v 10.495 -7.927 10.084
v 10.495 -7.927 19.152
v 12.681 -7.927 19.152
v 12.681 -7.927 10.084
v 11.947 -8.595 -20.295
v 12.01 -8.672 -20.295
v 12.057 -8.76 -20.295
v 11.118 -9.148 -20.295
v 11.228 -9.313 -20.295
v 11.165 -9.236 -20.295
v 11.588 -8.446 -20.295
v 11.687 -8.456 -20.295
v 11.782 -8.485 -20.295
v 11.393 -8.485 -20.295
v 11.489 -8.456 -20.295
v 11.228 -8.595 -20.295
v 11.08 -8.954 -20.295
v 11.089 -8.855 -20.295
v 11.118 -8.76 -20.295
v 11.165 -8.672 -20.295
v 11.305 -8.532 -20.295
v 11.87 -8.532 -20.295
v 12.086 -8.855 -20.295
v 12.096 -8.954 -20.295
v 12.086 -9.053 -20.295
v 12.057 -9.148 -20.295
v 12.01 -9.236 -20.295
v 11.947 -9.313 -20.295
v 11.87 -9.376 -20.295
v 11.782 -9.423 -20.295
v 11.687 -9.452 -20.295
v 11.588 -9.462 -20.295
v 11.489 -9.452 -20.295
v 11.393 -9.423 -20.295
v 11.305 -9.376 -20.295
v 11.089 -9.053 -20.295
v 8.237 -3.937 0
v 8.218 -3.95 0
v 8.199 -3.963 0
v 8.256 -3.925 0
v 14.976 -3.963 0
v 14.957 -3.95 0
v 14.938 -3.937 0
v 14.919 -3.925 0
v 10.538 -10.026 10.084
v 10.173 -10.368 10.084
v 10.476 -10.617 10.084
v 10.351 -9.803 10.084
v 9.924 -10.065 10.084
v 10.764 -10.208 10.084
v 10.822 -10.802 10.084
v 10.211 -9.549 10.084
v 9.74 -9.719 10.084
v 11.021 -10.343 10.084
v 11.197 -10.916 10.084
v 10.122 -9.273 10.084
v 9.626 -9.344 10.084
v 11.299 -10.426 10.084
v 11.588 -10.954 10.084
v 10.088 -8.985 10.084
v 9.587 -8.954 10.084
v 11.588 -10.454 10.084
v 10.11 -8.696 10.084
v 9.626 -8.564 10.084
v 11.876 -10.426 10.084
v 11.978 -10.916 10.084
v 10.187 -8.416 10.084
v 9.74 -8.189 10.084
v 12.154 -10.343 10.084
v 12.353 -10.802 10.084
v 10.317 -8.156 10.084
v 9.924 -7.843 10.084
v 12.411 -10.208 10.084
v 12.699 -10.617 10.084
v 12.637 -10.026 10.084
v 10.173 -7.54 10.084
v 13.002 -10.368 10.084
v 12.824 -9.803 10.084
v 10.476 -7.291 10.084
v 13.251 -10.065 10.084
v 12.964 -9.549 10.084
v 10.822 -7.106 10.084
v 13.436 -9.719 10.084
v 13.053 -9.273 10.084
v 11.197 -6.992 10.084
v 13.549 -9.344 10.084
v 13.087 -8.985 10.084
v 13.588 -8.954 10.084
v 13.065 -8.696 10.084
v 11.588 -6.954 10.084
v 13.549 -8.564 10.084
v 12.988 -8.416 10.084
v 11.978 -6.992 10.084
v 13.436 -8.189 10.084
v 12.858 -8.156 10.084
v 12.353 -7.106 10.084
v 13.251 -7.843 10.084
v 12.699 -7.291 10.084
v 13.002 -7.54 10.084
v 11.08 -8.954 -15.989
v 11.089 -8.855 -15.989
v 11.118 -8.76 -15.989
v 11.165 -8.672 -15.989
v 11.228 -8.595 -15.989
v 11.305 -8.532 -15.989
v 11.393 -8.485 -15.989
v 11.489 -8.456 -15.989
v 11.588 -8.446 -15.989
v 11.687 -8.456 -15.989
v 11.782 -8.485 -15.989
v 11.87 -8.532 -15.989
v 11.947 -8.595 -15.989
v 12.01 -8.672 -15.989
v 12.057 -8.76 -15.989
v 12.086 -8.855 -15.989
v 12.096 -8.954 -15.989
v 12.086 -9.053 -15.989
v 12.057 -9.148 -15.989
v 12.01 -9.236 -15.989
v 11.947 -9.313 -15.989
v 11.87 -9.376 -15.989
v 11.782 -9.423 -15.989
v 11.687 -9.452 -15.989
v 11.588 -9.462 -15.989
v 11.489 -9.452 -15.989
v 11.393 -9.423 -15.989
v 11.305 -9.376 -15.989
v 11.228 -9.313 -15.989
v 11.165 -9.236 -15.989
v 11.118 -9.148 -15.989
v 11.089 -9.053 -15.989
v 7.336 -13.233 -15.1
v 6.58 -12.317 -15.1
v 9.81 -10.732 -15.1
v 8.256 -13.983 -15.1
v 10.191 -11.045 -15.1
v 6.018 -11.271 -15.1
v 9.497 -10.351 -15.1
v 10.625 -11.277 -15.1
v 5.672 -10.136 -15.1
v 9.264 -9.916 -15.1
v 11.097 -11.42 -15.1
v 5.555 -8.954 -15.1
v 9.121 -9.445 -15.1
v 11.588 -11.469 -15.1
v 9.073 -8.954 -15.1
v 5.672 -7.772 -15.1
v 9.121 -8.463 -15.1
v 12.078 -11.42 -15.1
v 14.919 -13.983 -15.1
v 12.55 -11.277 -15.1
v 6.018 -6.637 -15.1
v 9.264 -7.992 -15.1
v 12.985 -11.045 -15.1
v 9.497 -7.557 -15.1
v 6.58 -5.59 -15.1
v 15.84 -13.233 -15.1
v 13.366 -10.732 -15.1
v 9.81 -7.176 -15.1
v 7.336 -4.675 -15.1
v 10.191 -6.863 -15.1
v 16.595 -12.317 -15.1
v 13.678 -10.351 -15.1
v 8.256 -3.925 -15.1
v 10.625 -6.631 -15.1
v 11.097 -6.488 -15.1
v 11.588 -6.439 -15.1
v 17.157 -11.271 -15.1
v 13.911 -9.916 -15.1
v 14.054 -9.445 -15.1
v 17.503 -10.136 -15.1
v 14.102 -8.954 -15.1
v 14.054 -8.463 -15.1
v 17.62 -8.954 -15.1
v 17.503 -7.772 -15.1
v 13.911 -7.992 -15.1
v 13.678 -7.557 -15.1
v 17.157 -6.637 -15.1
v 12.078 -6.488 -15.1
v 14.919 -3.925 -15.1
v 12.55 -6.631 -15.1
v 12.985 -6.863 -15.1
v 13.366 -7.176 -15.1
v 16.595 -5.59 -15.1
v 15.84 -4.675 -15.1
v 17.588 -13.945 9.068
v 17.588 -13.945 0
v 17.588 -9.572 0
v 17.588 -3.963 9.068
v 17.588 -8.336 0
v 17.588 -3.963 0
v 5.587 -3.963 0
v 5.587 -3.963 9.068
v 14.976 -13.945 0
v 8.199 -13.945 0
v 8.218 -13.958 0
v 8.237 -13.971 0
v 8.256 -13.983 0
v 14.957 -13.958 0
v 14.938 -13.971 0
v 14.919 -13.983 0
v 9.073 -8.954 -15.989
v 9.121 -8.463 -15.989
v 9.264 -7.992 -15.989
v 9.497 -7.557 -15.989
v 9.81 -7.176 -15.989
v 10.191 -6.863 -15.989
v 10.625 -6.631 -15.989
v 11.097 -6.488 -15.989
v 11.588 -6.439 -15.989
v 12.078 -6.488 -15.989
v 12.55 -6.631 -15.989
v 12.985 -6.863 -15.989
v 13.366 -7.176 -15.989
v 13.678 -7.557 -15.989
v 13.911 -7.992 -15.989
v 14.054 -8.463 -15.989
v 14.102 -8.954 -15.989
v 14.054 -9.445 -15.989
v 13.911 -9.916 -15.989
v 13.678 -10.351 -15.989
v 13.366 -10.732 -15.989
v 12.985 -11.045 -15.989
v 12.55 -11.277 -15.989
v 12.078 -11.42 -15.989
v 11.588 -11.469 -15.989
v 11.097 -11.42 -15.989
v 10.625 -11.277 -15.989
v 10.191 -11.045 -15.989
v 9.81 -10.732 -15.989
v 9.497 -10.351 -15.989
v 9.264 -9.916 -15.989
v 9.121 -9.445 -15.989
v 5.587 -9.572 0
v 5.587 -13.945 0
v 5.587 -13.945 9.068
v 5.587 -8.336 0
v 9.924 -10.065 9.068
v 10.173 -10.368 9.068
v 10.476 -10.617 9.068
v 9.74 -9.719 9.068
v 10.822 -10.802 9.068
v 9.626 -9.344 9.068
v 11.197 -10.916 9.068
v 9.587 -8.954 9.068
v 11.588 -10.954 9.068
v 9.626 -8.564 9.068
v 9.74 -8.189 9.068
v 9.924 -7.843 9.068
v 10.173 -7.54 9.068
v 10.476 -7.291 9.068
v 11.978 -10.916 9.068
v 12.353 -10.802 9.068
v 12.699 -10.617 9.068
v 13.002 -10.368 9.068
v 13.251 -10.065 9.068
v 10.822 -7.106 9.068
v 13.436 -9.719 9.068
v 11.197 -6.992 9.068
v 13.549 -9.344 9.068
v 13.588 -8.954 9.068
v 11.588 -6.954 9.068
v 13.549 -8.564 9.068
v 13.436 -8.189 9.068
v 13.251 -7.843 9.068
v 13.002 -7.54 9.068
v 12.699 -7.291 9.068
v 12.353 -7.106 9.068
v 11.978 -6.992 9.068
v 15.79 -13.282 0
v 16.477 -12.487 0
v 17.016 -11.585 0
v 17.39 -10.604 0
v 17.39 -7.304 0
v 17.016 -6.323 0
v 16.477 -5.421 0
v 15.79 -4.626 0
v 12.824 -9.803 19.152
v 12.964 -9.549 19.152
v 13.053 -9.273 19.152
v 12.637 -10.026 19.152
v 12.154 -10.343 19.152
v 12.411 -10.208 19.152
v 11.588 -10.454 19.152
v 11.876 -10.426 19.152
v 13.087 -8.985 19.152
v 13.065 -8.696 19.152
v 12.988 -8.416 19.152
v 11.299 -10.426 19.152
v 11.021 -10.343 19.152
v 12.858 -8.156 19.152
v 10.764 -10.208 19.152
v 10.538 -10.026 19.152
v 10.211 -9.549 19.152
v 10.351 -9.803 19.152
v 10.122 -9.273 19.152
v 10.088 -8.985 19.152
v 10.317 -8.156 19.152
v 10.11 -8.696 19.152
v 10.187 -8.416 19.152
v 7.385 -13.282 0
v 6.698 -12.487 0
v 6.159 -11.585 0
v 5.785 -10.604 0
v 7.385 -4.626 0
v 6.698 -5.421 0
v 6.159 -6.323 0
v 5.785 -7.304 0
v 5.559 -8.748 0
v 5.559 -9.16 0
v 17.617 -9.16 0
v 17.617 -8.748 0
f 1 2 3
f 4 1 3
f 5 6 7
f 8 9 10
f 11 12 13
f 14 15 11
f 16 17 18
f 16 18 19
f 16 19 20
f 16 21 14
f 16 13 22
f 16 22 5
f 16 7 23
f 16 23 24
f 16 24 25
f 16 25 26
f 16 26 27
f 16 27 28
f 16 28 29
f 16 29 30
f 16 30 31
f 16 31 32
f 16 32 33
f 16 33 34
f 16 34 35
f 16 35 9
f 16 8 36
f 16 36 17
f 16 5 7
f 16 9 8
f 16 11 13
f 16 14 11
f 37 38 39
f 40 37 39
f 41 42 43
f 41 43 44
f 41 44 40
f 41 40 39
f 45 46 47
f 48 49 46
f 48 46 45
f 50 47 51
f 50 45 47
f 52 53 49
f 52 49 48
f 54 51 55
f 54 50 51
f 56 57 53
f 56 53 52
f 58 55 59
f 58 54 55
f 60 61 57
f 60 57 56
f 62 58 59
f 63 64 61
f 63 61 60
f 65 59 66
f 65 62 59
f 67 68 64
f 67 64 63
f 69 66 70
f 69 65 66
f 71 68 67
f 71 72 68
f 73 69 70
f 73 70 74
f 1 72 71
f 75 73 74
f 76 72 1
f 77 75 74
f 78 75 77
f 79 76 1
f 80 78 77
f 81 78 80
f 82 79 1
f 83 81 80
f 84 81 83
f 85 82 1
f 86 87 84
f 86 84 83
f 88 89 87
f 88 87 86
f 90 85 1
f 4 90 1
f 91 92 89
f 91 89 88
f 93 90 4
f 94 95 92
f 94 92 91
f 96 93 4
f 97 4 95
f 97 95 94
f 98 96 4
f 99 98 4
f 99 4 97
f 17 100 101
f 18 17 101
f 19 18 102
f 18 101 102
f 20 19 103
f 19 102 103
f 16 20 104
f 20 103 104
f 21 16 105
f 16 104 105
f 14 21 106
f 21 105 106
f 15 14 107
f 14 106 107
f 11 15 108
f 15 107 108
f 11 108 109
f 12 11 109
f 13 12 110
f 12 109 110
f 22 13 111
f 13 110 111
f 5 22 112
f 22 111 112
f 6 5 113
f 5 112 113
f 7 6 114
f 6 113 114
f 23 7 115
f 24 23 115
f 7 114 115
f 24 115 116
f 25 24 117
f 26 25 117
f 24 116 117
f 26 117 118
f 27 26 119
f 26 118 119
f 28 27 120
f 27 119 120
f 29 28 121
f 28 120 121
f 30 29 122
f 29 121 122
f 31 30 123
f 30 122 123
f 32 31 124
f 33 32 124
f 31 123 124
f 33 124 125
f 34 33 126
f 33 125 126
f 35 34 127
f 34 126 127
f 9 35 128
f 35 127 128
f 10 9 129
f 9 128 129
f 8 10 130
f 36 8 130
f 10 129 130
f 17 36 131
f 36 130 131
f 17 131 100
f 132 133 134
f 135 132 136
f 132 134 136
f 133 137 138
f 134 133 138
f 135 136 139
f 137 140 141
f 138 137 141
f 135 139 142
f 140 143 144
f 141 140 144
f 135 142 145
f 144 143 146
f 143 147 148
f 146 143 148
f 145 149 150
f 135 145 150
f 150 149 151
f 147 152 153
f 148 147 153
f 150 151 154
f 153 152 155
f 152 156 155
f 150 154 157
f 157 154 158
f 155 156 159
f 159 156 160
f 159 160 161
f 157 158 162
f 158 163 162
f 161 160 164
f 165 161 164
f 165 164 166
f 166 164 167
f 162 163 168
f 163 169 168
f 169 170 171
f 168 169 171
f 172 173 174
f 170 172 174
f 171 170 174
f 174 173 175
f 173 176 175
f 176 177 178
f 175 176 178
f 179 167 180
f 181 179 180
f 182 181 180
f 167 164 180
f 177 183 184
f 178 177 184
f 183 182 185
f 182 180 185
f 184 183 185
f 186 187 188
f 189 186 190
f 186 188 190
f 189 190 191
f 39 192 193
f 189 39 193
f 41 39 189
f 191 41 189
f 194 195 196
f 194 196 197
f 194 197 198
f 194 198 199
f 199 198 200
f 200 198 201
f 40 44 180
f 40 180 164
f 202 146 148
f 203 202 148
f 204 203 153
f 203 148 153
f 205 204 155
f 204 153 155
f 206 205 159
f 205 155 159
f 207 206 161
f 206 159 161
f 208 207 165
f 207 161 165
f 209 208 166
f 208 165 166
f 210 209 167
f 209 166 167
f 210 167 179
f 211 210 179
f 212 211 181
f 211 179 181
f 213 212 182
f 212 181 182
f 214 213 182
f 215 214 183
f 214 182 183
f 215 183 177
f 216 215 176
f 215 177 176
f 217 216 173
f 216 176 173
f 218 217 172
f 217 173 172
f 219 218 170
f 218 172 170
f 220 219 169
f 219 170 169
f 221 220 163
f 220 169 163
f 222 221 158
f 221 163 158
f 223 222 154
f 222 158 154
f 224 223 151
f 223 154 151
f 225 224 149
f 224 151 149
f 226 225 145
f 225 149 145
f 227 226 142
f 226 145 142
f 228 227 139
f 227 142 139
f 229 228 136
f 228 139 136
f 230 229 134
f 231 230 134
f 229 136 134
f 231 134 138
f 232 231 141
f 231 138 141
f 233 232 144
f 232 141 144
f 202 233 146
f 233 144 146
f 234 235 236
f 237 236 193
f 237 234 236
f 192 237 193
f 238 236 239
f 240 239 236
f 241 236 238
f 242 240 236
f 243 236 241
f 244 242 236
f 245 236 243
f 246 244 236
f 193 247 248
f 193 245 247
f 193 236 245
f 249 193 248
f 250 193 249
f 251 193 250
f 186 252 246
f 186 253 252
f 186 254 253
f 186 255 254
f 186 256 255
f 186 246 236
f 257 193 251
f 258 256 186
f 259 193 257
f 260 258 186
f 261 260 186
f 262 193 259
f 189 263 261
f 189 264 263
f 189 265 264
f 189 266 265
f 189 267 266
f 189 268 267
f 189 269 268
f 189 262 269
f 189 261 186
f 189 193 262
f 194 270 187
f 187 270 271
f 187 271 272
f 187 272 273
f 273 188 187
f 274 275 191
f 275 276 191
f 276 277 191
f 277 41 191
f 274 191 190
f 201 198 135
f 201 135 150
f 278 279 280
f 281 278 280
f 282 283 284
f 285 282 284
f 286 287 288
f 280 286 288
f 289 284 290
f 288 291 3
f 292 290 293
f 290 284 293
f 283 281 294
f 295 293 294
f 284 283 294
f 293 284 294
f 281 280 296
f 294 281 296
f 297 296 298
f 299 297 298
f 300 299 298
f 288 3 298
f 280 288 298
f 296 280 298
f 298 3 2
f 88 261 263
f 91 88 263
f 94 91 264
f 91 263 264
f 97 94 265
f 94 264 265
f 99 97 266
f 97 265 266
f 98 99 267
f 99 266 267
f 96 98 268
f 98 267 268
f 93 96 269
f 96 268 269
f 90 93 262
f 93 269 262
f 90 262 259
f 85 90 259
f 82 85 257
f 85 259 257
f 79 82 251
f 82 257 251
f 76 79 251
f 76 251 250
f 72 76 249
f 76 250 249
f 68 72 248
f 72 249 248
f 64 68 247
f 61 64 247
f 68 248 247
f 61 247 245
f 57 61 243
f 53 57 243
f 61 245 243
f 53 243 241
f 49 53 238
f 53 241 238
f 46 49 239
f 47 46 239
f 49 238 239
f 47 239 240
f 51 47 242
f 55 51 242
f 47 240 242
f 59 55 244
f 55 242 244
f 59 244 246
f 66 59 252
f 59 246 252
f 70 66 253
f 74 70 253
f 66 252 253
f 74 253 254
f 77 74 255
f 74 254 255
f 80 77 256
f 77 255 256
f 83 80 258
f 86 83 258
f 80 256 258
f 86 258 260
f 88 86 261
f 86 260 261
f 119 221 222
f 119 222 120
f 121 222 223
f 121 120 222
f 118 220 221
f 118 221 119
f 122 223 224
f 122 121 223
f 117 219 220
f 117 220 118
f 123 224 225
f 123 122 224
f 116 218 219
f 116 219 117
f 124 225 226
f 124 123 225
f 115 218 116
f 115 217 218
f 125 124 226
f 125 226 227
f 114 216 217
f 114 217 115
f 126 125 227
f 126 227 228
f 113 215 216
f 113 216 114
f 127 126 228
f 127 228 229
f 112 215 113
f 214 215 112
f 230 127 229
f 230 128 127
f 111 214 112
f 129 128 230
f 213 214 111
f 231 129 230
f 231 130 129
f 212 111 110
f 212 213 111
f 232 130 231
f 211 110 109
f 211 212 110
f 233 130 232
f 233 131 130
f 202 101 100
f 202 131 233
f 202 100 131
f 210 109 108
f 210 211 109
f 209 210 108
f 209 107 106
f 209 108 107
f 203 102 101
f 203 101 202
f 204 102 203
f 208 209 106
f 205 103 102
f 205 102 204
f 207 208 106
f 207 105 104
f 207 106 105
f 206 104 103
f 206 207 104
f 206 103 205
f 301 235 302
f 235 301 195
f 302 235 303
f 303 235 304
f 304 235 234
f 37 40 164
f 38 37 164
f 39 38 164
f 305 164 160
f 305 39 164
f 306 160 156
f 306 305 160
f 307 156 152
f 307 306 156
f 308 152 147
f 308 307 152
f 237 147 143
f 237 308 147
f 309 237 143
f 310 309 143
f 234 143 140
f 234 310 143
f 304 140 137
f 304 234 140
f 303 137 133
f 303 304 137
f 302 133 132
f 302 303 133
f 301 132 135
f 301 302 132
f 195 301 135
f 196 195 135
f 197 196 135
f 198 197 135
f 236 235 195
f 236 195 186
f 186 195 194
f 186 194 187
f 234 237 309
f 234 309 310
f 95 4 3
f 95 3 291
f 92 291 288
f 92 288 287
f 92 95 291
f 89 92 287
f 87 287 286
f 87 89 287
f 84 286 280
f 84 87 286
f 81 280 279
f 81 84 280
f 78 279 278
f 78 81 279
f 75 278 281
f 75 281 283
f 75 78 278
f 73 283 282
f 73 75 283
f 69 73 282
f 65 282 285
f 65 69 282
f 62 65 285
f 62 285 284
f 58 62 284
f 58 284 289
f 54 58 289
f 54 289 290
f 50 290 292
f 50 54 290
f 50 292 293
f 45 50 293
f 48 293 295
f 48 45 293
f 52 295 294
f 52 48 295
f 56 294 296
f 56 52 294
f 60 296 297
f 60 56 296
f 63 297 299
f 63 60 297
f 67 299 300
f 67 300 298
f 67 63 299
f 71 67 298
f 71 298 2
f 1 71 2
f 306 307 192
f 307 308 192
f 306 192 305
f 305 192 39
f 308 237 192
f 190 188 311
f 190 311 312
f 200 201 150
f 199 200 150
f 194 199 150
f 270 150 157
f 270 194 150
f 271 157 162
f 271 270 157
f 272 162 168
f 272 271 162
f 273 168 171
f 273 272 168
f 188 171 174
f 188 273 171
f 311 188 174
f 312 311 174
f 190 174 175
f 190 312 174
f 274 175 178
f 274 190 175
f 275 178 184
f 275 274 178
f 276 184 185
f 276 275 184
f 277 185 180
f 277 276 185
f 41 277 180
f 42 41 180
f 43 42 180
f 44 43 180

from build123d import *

# Parameters (mm, degrees)
SKETCH1_W            = 12.0015
SKETCH1_H            = 9.9822
BOSS_EXTRUDE4_DEPTH  = 9.0678
BOSS_EXTRUDE5_DEPTH  = 15.1003
SKETCH4_R            = 2.00025
BOSS_EXTRUDE9_DEPTH  = 1.016
BOSS_EXTRUDE10_DEPTH = 9.0678
SKETCH6_R            = 2.5146
BOSS_EXTRUDE11_DEPTH = 0.889
SKETCH7_R            = 0.508
BOSS_EXTRUDE12_DEPTH = 4.3053


with BuildPart() as part:
    # Sketch1 → Boss-Extrude4 (new body)
    with BuildSketch(Plane.XY):
        with Locations((11.58762082, -8.953965436)):
            Rectangle(SKETCH1_W, SKETCH1_H)
    extrude(amount=BOSS_EXTRUDE4_DEPTH)

    # Sketch3 → Boss-Extrude5 (add)
    with BuildSketch(Plane(origin=(0, 0, 0), x_dir=(-1, 0, 0), z_dir=(0, 0, -1))):
        with BuildLine():
            Line((-14.919017466, -3.924765436), (-8.256224175, -3.924765436))
            ThreePointArc((-8.256224175, -3.924765436), (-5.55512082, -8.953965436), (-8.256224175, -13.983165436))
            Line((-8.256224175, -13.983165436), (-14.919017466, -13.983165436))
            ThreePointArc((-14.919017466, -13.983165436), (-17.62012082, -8.953965436), (-14.919017466, -3.924765436))
        make_face()
    extrude(amount=BOSS_EXTRUDE5_DEPTH)

    # Sketch4 → Boss-Extrude9 (add)
    with BuildSketch(Plane.XY.offset(9.0678)):
        with Locations((11.58762082, -8.953965436)):
            Circle(SKETCH4_R)
    extrude(amount=BOSS_EXTRUDE9_DEPTH)

    # Sketch5 → Boss-Extrude10 (add)
    with BuildSketch(Plane.XY.offset(10.0838)):
        with BuildLine():
            Line((10.494618208, -7.926665436), (12.680623432, -7.926665436))
            ThreePointArc((12.680623432, -7.926665436), (11.58762082, -10.453965436), (10.494618208, -7.926665436))
        make_face()
    extrude(amount=BOSS_EXTRUDE10_DEPTH)

    # Sketch6 → Boss-Extrude11 (add)
    with BuildSketch(Plane(origin=(0, 0, -15.1003), x_dir=(-1, 0, 0), z_dir=(0, 0, -1))):
        with Locations((-11.58762082, -8.953965436)):
            Circle(SKETCH6_R)
    extrude(amount=BOSS_EXTRUDE11_DEPTH)

    # Sketch7 → Boss-Extrude12 (add)
    with BuildSketch(Plane(origin=(0, 0, -15.9893), x_dir=(-1, 0, 0), z_dir=(0, 0, -1))):
        with Locations((-11.58762082, -8.953965436)):
            Circle(SKETCH7_R)
    extrude(amount=BOSS_EXTRUDE12_DEPTH)


solid = part.part
